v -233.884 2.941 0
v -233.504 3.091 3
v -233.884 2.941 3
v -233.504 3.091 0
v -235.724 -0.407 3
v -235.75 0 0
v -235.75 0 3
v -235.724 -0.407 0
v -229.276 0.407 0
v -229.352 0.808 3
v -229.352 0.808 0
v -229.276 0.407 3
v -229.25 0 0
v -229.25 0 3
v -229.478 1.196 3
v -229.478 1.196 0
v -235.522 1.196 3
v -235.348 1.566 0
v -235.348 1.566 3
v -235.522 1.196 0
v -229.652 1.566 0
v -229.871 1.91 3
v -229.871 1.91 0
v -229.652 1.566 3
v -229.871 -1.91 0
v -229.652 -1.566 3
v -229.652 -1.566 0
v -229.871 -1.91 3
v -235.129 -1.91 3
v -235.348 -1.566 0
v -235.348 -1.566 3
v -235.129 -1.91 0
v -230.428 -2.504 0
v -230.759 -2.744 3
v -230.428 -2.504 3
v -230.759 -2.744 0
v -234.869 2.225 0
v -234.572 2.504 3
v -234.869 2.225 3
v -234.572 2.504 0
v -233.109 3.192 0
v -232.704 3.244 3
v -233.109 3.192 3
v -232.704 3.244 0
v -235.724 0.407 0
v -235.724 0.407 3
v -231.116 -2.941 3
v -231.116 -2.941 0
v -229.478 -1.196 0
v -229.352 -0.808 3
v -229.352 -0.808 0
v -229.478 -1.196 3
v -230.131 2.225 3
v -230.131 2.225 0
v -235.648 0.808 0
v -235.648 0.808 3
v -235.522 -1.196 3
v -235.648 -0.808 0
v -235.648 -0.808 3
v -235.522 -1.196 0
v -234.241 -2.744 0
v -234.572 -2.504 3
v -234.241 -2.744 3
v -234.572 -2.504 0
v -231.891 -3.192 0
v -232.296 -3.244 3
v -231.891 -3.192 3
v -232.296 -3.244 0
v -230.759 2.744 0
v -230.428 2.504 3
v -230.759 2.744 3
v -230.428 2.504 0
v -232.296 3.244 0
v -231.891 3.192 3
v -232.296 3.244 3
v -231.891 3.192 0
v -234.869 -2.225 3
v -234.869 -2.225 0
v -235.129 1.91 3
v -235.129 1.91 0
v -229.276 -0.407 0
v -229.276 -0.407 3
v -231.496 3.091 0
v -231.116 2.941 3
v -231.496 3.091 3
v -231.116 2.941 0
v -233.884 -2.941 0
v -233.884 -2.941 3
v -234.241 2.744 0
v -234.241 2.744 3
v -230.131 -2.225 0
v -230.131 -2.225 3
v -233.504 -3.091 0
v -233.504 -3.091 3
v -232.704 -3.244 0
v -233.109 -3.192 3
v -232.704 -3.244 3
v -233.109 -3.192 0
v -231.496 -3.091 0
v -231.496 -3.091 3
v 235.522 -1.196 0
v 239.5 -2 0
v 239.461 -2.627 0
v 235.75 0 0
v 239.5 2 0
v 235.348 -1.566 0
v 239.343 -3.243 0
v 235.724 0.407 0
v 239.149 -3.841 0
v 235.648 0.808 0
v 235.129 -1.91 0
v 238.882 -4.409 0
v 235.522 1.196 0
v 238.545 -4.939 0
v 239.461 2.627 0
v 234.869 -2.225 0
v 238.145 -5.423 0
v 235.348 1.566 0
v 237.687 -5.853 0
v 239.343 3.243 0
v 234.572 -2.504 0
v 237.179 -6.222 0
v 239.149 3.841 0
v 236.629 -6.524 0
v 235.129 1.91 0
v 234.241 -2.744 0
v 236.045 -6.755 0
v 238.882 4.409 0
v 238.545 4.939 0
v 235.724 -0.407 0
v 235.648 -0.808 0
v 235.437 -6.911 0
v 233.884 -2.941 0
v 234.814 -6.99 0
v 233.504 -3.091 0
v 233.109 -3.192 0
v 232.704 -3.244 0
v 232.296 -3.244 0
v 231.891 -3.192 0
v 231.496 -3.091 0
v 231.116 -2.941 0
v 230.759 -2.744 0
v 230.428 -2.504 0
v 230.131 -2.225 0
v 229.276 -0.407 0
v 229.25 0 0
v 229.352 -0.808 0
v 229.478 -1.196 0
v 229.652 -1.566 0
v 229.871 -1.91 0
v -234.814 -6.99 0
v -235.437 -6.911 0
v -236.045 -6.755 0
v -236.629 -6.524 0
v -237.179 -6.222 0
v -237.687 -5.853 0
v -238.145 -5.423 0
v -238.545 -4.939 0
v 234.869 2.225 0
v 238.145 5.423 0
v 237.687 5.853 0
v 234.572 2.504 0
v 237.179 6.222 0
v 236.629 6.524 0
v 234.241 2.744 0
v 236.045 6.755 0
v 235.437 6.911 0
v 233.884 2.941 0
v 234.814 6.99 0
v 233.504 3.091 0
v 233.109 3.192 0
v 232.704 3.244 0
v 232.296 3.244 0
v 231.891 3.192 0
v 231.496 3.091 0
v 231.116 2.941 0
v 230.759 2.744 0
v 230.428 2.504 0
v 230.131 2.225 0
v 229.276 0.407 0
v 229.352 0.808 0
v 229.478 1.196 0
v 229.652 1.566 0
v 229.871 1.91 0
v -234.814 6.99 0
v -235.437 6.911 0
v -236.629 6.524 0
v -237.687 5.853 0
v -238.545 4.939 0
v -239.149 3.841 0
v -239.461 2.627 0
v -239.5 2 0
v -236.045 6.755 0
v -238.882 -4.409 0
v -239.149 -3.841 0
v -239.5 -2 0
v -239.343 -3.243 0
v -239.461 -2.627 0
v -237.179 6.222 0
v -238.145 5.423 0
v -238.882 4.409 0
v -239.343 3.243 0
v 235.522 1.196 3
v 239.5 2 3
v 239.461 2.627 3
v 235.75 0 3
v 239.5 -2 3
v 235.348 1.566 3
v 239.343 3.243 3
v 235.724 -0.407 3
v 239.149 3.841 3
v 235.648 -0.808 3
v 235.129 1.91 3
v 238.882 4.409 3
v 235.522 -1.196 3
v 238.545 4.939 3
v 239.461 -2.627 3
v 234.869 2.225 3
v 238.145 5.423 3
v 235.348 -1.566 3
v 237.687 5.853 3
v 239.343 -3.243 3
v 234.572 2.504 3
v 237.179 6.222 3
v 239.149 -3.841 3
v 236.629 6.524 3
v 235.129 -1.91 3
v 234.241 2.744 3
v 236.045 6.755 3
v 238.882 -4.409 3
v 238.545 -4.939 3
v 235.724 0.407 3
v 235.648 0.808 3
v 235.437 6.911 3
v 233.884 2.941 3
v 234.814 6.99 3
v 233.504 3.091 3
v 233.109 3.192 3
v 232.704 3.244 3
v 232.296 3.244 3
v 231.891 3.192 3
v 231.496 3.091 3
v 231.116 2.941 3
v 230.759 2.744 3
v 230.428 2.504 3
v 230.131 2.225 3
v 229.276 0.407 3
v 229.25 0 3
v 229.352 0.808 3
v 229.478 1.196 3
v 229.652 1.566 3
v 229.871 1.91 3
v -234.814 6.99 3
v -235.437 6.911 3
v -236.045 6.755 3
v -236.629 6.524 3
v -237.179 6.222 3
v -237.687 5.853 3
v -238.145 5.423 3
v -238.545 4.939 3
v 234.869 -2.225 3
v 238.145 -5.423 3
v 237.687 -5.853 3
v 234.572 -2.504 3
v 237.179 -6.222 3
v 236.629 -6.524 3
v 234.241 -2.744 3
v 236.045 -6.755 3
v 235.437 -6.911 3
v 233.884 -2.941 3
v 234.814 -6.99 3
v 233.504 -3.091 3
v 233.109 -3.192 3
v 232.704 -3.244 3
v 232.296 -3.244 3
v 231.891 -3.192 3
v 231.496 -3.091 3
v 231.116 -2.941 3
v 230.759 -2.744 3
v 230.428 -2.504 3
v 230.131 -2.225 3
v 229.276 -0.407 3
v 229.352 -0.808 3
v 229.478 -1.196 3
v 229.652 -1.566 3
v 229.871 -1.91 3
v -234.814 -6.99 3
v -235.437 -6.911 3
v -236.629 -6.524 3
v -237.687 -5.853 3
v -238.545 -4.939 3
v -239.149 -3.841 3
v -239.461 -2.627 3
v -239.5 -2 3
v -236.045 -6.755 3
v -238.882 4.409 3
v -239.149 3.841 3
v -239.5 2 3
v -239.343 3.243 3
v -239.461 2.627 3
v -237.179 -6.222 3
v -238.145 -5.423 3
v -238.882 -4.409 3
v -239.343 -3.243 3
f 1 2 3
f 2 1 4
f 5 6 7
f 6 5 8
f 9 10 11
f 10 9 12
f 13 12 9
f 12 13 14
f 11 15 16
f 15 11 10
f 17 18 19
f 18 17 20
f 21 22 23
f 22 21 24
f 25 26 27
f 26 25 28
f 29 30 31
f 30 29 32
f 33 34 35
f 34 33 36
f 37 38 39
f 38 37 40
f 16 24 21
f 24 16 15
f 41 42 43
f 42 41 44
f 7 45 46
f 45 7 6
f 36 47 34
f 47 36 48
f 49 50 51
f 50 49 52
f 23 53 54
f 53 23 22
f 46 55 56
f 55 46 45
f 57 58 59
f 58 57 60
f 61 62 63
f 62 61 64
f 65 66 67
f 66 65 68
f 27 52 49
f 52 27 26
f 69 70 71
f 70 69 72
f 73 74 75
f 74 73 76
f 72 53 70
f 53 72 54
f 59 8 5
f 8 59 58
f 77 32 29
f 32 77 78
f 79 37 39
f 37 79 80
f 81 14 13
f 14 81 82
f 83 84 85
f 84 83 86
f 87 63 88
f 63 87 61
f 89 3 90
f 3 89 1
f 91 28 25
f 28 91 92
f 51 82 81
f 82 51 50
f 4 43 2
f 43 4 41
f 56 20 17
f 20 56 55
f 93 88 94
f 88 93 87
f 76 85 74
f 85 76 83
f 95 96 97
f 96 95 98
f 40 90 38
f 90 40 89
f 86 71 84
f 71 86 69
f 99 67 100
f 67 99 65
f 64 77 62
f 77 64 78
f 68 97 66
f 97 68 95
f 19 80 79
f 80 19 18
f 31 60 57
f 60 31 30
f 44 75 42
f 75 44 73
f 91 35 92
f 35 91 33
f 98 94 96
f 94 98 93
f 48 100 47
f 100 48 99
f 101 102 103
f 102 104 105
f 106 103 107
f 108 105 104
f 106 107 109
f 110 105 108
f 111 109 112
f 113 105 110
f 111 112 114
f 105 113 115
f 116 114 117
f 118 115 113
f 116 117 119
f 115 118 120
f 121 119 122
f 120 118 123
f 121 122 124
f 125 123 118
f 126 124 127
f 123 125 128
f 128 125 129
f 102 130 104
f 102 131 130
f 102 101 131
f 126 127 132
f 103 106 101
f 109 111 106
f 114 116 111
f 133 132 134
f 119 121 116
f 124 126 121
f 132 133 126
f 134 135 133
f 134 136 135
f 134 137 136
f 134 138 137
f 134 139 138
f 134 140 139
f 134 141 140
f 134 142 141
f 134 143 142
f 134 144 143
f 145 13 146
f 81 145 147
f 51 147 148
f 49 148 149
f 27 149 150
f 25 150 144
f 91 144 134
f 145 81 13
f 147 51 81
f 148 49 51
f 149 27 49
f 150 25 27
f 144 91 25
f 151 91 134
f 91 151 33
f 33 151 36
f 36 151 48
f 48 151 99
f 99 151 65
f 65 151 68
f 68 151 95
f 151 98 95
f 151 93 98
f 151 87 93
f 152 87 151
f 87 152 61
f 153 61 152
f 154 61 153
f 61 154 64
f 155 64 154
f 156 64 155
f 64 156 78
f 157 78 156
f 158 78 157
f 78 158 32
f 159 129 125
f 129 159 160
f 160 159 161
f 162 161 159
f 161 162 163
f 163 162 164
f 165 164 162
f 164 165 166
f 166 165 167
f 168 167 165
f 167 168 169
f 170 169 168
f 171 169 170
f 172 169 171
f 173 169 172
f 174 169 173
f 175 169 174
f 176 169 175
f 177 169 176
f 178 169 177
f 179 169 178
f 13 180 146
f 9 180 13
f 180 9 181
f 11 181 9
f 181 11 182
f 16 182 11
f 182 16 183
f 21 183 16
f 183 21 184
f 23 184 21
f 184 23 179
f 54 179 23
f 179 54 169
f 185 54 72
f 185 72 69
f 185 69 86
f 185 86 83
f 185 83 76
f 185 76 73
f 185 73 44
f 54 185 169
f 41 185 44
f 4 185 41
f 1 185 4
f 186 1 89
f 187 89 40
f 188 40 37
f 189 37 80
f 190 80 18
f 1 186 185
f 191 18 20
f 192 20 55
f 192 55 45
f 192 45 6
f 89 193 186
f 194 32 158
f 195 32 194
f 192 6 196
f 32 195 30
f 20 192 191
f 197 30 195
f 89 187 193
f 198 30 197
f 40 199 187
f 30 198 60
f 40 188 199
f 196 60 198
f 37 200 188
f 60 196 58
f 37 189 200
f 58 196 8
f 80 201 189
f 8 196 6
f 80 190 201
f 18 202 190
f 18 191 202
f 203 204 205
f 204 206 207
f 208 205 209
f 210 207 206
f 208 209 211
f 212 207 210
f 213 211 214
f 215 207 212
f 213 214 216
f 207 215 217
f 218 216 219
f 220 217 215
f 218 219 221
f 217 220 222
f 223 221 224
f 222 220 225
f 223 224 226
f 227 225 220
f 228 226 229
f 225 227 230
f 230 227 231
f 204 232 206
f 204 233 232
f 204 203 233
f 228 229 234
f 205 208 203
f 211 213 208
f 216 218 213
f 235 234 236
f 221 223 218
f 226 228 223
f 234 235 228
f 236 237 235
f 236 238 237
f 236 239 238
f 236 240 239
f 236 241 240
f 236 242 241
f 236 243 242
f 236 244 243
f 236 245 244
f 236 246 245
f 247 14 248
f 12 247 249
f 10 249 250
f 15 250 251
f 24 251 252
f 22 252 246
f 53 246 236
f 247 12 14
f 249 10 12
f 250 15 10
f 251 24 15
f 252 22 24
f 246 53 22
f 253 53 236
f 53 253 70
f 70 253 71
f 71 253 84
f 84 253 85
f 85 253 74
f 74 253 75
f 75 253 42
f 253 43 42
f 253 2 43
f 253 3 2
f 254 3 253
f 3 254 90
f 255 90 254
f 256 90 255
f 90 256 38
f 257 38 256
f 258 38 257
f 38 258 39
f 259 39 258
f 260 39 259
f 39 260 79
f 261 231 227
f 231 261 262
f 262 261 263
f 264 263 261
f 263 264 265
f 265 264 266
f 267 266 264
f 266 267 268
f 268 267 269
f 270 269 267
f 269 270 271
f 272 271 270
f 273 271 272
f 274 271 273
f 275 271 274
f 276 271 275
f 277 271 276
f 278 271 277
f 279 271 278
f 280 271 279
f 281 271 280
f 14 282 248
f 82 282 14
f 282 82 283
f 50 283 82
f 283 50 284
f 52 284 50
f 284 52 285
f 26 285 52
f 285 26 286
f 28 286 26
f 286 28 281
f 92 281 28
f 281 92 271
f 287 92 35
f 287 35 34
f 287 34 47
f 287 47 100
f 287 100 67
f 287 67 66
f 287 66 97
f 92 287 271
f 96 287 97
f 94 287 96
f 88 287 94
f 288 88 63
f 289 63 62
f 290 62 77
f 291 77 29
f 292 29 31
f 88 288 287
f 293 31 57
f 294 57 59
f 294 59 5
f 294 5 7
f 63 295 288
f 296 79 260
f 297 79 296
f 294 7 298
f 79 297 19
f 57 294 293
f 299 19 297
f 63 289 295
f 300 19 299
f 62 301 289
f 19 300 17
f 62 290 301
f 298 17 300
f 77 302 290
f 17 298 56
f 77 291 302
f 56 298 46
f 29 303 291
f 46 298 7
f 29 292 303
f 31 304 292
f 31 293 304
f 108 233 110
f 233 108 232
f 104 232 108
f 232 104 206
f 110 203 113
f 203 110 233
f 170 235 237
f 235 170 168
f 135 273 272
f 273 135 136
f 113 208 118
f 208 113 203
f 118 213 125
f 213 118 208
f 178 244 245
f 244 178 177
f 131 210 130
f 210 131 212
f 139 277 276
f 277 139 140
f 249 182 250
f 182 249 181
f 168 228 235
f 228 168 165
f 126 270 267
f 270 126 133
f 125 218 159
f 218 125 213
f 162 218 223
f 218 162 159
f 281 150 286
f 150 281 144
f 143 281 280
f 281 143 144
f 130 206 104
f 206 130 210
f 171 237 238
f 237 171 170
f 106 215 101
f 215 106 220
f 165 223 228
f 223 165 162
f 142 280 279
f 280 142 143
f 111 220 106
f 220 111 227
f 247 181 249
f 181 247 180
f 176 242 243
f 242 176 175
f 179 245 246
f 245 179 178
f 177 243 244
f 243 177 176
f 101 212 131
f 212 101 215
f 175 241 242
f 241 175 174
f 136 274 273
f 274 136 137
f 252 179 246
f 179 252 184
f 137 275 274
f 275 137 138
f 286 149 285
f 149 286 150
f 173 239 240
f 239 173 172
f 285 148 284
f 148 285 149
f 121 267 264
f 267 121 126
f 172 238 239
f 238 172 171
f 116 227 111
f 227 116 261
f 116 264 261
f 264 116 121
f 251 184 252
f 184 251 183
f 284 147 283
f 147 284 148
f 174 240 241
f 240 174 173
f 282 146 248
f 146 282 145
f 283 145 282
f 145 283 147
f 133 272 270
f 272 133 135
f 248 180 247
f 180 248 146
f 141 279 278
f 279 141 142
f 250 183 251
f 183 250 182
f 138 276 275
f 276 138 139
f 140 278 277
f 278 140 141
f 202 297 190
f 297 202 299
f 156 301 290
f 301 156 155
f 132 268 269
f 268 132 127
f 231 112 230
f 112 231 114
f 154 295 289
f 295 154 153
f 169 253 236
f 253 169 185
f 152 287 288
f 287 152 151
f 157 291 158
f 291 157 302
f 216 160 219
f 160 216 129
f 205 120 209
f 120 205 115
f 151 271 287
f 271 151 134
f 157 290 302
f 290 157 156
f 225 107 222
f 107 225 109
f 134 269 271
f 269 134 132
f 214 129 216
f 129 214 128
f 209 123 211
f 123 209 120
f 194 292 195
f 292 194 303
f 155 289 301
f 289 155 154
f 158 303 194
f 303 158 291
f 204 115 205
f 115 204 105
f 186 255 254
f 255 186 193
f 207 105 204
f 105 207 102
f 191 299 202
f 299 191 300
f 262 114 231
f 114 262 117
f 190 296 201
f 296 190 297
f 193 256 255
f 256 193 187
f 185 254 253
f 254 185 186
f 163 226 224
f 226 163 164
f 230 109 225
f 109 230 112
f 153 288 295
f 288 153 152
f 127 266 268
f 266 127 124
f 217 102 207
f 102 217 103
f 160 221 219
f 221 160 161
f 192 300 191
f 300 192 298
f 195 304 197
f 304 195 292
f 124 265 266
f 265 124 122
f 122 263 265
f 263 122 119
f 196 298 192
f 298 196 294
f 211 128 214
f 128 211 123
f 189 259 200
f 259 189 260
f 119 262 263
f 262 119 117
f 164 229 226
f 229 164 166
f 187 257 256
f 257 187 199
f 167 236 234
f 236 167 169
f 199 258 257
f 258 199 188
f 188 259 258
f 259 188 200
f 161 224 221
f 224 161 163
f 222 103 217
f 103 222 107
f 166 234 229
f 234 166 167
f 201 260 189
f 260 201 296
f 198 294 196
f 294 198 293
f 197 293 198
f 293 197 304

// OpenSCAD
$fn = 50;


difference() {
	union() {
		hull() {
			translate(v = [-234.5000000000, 2.0000000000, 0]) {
				cylinder(h = 3, r = 5);
			}
			translate(v = [234.5000000000, 2.0000000000, 0]) {
				cylinder(h = 3, r = 5);
			}
			translate(v = [-234.5000000000, -2.0000000000, 0]) {
				cylinder(h = 3, r = 5);
			}
			translate(v = [234.5000000000, -2.0000000000, 0]) {
				cylinder(h = 3, r = 5);
			}
		}
	}
	union() {
		translate(v = [-232.5000000000, 0.0000000000, 0]) {
			cylinder(h = 3, r = 3.2500000000);
		}
		translate(v = [232.5000000000, 0.0000000000, 0]) {
			cylinder(h = 3, r = 3.2500000000);
		}
		translate(v = [-232.5000000000, 0.0000000000, 0]) {
			cylinder(h = 3, r = 1.8000000000);
		}
		translate(v = [232.5000000000, 0.0000000000, 0]) {
			cylinder(h = 3, r = 1.8000000000);
		}
		translate(v = [-232.5000000000, 0.0000000000, 0]) {
			cylinder(h = 3, r = 1.8000000000);
		}
		translate(v = [232.5000000000, 0.0000000000, 0]) {
			cylinder(h = 3, r = 1.8000000000);
		}
		translate(v = [-232.5000000000, 0.0000000000, 0]) {
			cylinder(h = 3, r = 1.8000000000);
		}
		translate(v = [232.5000000000, 0.0000000000, 0]) {
			cylinder(h = 3, r = 1.8000000000);
		}
	}
}
